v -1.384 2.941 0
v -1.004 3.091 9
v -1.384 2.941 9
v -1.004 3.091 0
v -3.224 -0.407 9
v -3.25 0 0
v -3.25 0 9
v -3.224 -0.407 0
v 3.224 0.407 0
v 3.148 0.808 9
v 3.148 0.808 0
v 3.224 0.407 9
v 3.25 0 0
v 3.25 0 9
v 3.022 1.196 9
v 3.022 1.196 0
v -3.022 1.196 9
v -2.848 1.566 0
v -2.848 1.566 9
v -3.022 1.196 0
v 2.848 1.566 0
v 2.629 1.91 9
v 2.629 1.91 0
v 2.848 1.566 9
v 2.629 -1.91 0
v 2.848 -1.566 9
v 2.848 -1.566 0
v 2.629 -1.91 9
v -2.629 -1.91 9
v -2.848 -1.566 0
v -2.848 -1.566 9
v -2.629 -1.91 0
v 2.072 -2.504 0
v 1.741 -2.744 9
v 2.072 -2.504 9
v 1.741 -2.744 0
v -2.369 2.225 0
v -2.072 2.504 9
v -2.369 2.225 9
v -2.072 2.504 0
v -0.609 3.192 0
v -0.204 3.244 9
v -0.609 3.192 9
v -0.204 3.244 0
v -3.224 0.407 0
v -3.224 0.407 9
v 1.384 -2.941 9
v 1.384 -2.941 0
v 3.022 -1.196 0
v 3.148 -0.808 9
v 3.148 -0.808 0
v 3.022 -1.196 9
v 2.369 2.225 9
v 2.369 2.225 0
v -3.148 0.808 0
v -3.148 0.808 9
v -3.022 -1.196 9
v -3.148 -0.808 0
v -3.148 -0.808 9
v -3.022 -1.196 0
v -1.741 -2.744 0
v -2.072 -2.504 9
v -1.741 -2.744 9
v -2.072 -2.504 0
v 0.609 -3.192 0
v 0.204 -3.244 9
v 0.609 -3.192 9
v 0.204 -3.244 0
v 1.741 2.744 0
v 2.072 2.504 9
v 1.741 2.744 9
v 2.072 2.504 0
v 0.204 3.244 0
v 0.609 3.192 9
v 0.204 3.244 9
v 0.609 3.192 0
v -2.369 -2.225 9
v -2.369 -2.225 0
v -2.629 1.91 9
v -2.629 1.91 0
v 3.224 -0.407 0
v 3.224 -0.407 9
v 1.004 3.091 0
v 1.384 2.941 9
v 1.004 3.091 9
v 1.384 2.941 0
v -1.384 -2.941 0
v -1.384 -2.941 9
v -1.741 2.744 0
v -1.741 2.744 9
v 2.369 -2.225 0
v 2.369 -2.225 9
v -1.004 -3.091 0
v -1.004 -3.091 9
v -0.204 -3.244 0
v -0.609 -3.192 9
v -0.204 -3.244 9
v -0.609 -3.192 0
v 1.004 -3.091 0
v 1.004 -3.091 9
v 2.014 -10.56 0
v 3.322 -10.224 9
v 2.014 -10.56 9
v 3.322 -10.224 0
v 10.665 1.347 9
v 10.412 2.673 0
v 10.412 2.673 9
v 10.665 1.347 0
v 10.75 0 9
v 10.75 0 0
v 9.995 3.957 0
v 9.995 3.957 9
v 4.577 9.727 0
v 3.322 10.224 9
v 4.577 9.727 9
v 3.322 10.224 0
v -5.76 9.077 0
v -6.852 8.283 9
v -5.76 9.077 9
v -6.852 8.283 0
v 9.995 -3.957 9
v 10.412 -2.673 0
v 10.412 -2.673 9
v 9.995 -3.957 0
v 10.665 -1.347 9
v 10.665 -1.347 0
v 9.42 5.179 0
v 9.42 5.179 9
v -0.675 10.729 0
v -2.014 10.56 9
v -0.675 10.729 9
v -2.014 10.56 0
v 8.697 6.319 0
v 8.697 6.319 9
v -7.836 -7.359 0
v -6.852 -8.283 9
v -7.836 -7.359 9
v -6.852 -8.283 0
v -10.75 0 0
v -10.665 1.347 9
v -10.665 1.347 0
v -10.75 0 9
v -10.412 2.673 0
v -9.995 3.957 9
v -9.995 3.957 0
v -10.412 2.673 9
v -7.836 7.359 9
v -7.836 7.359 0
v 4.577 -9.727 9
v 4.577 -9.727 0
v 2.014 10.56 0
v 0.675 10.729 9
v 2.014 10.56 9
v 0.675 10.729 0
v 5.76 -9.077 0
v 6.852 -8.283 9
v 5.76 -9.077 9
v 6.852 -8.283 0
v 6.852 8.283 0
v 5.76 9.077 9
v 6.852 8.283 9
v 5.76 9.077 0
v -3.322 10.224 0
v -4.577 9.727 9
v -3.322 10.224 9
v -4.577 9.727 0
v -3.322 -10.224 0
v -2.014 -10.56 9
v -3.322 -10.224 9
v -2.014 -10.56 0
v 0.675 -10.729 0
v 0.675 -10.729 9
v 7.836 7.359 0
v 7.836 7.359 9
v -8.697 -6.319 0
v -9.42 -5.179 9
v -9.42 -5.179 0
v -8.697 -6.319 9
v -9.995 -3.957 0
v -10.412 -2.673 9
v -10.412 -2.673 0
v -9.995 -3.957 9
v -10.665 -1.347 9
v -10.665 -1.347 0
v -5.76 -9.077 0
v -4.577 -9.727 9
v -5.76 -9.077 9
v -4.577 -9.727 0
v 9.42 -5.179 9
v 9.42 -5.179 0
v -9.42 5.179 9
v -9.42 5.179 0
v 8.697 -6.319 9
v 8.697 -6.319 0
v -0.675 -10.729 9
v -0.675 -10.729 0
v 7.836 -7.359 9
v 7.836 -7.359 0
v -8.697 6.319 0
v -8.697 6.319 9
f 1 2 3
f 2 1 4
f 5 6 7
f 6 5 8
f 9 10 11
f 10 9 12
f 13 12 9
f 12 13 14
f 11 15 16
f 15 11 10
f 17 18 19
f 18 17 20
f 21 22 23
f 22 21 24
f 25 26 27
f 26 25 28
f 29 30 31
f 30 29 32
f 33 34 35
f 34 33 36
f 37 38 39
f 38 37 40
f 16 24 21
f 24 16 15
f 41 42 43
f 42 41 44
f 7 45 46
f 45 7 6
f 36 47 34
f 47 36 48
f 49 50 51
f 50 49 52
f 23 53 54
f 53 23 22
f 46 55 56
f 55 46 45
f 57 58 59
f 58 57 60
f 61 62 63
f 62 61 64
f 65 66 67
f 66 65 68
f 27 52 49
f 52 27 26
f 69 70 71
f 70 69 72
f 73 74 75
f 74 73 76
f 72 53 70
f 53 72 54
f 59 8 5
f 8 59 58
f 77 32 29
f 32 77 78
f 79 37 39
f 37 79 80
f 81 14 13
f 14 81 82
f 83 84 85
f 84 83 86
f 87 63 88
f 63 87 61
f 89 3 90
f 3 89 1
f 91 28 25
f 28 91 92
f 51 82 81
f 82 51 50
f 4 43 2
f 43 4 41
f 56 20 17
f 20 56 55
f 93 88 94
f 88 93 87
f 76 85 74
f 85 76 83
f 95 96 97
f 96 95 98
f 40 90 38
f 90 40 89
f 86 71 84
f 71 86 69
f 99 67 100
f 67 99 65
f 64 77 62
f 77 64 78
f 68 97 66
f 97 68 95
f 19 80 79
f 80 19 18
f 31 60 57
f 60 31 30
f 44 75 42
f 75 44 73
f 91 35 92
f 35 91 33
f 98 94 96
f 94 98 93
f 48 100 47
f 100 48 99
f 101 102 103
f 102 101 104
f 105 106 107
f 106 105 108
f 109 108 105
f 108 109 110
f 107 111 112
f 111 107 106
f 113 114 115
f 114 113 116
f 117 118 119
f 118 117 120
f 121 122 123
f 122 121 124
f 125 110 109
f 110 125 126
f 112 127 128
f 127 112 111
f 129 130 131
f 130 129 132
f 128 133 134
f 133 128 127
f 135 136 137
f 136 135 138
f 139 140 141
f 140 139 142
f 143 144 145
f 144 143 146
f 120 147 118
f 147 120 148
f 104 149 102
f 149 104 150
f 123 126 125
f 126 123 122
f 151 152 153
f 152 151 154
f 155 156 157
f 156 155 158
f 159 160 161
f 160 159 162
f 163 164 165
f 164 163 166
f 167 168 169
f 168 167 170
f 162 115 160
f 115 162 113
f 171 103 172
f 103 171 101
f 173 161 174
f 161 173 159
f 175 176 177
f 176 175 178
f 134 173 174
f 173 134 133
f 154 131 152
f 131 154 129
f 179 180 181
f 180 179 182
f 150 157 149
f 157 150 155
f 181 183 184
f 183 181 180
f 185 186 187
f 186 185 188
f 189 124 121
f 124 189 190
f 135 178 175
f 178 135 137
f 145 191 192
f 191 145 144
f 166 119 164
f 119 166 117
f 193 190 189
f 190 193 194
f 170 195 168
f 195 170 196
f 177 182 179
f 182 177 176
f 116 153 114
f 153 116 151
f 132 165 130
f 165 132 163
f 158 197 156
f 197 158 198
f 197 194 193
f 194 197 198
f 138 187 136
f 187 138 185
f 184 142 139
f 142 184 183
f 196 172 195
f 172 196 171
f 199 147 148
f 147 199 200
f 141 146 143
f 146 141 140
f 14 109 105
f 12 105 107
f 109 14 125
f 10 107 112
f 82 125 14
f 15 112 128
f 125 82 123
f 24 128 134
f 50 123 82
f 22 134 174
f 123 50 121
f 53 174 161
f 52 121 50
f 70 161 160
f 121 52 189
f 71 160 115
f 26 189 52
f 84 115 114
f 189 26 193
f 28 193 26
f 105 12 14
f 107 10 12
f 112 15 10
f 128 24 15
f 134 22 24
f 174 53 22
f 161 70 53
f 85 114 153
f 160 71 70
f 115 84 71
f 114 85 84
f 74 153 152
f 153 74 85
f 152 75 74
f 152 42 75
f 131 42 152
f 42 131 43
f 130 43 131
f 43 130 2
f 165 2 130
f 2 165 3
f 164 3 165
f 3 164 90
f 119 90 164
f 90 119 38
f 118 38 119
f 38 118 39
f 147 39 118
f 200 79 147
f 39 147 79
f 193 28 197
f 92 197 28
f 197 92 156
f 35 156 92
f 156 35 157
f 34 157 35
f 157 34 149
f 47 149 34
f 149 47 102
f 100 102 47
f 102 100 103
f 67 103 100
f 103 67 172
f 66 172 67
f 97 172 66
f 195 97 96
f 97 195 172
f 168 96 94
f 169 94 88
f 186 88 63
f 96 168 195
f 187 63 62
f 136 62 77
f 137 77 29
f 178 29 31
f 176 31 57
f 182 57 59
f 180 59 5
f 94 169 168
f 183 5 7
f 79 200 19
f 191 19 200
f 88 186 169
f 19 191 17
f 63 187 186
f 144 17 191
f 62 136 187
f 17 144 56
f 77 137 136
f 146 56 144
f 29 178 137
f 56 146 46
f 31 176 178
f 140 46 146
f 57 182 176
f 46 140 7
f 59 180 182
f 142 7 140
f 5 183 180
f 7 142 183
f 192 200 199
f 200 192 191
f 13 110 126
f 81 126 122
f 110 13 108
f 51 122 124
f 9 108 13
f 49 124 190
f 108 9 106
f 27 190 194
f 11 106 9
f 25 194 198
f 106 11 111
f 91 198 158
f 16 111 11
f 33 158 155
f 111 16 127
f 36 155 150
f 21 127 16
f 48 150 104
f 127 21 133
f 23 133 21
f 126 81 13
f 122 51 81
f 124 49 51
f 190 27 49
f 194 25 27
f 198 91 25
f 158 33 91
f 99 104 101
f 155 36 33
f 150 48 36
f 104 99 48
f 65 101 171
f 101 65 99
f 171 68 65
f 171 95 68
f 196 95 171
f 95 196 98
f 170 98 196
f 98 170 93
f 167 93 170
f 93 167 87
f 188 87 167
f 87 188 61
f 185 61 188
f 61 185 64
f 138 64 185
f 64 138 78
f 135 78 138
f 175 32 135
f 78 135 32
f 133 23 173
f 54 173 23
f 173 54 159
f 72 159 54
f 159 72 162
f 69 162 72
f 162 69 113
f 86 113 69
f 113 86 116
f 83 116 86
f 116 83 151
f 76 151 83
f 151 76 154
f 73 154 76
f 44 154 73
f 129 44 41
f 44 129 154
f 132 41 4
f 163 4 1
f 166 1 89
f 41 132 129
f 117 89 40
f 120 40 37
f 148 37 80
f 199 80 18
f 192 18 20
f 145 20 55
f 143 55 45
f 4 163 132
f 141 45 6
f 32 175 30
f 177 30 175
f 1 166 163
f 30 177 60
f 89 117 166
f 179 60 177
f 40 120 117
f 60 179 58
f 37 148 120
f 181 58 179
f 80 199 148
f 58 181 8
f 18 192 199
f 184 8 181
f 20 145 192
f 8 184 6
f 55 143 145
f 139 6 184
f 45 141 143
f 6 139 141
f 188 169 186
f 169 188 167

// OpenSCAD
$fn = 50;


difference() {
	union() {
		*color(alpha = 1.0000000000, c = "gray") {
			translate(v = [0, 7, 0]) {
				linear_extrude(height = 1) {
					text(font = "Arial:style=Bold", halign = "center", size = 4.5000000000, text = "COMMENT circle main", valign = "center");
				}
			}
		}
		*color(alpha = 1.0000000000, c = "gray") {
			translate(v = [0, 14, 0]) {
				linear_extrude(height = 1.5000000000) {
					text(font = "Arial:style=Bold", halign = "center", size = 4.5000000000, text = "COMMENT description oobb_circle_shape_p_type_9_depth_1.5_diameter_9_thickness_1.5_width_1.5_height", valign = "center");
				}
			}
		}
		cylinder(h = 9, r = 10.7500000000);
	}
	union() {
		*color(alpha = 1.0000000000, c = "gray") {
			translate(v = [0, 7, 0]) {
				linear_extrude(height = 1) {
					text(font = "Arial:style=Bold", halign = "center", size = 4.5000000000, text = "COMMENT holes main", valign = "center");
				}
			}
		}
		*color(alpha = 1.0000000000, c = "gray") {
			translate(v = [0, 14, 0]) {
				linear_extrude(height = 1.5000000000) {
					text(font = "Arial:style=Bold", halign = "center", size = 4.5000000000, text = "COMMENT description oobb_holes_shape_n_type_1.5_diameter_9_thickness_1.5_width_1.5_height_true_both_holes_true_circle", valign = "center");
				}
			}
		}
		translate(v = [0.0000000000, 0.0000000000, -50.0000000000]) {
			cylinder(h = 100, r = 3.2500000000);
		}
		translate(v = [0.0000000000, 0.0000000000, -50.0000000000]) {
			cylinder(h = 100, r = 3.2500000000);
		}
		translate(v = [0.0000000000, 0.0000000000, -50.0000000000]) {
			cylinder(h = 100, r = 3.2500000000);
		}
	}
}
